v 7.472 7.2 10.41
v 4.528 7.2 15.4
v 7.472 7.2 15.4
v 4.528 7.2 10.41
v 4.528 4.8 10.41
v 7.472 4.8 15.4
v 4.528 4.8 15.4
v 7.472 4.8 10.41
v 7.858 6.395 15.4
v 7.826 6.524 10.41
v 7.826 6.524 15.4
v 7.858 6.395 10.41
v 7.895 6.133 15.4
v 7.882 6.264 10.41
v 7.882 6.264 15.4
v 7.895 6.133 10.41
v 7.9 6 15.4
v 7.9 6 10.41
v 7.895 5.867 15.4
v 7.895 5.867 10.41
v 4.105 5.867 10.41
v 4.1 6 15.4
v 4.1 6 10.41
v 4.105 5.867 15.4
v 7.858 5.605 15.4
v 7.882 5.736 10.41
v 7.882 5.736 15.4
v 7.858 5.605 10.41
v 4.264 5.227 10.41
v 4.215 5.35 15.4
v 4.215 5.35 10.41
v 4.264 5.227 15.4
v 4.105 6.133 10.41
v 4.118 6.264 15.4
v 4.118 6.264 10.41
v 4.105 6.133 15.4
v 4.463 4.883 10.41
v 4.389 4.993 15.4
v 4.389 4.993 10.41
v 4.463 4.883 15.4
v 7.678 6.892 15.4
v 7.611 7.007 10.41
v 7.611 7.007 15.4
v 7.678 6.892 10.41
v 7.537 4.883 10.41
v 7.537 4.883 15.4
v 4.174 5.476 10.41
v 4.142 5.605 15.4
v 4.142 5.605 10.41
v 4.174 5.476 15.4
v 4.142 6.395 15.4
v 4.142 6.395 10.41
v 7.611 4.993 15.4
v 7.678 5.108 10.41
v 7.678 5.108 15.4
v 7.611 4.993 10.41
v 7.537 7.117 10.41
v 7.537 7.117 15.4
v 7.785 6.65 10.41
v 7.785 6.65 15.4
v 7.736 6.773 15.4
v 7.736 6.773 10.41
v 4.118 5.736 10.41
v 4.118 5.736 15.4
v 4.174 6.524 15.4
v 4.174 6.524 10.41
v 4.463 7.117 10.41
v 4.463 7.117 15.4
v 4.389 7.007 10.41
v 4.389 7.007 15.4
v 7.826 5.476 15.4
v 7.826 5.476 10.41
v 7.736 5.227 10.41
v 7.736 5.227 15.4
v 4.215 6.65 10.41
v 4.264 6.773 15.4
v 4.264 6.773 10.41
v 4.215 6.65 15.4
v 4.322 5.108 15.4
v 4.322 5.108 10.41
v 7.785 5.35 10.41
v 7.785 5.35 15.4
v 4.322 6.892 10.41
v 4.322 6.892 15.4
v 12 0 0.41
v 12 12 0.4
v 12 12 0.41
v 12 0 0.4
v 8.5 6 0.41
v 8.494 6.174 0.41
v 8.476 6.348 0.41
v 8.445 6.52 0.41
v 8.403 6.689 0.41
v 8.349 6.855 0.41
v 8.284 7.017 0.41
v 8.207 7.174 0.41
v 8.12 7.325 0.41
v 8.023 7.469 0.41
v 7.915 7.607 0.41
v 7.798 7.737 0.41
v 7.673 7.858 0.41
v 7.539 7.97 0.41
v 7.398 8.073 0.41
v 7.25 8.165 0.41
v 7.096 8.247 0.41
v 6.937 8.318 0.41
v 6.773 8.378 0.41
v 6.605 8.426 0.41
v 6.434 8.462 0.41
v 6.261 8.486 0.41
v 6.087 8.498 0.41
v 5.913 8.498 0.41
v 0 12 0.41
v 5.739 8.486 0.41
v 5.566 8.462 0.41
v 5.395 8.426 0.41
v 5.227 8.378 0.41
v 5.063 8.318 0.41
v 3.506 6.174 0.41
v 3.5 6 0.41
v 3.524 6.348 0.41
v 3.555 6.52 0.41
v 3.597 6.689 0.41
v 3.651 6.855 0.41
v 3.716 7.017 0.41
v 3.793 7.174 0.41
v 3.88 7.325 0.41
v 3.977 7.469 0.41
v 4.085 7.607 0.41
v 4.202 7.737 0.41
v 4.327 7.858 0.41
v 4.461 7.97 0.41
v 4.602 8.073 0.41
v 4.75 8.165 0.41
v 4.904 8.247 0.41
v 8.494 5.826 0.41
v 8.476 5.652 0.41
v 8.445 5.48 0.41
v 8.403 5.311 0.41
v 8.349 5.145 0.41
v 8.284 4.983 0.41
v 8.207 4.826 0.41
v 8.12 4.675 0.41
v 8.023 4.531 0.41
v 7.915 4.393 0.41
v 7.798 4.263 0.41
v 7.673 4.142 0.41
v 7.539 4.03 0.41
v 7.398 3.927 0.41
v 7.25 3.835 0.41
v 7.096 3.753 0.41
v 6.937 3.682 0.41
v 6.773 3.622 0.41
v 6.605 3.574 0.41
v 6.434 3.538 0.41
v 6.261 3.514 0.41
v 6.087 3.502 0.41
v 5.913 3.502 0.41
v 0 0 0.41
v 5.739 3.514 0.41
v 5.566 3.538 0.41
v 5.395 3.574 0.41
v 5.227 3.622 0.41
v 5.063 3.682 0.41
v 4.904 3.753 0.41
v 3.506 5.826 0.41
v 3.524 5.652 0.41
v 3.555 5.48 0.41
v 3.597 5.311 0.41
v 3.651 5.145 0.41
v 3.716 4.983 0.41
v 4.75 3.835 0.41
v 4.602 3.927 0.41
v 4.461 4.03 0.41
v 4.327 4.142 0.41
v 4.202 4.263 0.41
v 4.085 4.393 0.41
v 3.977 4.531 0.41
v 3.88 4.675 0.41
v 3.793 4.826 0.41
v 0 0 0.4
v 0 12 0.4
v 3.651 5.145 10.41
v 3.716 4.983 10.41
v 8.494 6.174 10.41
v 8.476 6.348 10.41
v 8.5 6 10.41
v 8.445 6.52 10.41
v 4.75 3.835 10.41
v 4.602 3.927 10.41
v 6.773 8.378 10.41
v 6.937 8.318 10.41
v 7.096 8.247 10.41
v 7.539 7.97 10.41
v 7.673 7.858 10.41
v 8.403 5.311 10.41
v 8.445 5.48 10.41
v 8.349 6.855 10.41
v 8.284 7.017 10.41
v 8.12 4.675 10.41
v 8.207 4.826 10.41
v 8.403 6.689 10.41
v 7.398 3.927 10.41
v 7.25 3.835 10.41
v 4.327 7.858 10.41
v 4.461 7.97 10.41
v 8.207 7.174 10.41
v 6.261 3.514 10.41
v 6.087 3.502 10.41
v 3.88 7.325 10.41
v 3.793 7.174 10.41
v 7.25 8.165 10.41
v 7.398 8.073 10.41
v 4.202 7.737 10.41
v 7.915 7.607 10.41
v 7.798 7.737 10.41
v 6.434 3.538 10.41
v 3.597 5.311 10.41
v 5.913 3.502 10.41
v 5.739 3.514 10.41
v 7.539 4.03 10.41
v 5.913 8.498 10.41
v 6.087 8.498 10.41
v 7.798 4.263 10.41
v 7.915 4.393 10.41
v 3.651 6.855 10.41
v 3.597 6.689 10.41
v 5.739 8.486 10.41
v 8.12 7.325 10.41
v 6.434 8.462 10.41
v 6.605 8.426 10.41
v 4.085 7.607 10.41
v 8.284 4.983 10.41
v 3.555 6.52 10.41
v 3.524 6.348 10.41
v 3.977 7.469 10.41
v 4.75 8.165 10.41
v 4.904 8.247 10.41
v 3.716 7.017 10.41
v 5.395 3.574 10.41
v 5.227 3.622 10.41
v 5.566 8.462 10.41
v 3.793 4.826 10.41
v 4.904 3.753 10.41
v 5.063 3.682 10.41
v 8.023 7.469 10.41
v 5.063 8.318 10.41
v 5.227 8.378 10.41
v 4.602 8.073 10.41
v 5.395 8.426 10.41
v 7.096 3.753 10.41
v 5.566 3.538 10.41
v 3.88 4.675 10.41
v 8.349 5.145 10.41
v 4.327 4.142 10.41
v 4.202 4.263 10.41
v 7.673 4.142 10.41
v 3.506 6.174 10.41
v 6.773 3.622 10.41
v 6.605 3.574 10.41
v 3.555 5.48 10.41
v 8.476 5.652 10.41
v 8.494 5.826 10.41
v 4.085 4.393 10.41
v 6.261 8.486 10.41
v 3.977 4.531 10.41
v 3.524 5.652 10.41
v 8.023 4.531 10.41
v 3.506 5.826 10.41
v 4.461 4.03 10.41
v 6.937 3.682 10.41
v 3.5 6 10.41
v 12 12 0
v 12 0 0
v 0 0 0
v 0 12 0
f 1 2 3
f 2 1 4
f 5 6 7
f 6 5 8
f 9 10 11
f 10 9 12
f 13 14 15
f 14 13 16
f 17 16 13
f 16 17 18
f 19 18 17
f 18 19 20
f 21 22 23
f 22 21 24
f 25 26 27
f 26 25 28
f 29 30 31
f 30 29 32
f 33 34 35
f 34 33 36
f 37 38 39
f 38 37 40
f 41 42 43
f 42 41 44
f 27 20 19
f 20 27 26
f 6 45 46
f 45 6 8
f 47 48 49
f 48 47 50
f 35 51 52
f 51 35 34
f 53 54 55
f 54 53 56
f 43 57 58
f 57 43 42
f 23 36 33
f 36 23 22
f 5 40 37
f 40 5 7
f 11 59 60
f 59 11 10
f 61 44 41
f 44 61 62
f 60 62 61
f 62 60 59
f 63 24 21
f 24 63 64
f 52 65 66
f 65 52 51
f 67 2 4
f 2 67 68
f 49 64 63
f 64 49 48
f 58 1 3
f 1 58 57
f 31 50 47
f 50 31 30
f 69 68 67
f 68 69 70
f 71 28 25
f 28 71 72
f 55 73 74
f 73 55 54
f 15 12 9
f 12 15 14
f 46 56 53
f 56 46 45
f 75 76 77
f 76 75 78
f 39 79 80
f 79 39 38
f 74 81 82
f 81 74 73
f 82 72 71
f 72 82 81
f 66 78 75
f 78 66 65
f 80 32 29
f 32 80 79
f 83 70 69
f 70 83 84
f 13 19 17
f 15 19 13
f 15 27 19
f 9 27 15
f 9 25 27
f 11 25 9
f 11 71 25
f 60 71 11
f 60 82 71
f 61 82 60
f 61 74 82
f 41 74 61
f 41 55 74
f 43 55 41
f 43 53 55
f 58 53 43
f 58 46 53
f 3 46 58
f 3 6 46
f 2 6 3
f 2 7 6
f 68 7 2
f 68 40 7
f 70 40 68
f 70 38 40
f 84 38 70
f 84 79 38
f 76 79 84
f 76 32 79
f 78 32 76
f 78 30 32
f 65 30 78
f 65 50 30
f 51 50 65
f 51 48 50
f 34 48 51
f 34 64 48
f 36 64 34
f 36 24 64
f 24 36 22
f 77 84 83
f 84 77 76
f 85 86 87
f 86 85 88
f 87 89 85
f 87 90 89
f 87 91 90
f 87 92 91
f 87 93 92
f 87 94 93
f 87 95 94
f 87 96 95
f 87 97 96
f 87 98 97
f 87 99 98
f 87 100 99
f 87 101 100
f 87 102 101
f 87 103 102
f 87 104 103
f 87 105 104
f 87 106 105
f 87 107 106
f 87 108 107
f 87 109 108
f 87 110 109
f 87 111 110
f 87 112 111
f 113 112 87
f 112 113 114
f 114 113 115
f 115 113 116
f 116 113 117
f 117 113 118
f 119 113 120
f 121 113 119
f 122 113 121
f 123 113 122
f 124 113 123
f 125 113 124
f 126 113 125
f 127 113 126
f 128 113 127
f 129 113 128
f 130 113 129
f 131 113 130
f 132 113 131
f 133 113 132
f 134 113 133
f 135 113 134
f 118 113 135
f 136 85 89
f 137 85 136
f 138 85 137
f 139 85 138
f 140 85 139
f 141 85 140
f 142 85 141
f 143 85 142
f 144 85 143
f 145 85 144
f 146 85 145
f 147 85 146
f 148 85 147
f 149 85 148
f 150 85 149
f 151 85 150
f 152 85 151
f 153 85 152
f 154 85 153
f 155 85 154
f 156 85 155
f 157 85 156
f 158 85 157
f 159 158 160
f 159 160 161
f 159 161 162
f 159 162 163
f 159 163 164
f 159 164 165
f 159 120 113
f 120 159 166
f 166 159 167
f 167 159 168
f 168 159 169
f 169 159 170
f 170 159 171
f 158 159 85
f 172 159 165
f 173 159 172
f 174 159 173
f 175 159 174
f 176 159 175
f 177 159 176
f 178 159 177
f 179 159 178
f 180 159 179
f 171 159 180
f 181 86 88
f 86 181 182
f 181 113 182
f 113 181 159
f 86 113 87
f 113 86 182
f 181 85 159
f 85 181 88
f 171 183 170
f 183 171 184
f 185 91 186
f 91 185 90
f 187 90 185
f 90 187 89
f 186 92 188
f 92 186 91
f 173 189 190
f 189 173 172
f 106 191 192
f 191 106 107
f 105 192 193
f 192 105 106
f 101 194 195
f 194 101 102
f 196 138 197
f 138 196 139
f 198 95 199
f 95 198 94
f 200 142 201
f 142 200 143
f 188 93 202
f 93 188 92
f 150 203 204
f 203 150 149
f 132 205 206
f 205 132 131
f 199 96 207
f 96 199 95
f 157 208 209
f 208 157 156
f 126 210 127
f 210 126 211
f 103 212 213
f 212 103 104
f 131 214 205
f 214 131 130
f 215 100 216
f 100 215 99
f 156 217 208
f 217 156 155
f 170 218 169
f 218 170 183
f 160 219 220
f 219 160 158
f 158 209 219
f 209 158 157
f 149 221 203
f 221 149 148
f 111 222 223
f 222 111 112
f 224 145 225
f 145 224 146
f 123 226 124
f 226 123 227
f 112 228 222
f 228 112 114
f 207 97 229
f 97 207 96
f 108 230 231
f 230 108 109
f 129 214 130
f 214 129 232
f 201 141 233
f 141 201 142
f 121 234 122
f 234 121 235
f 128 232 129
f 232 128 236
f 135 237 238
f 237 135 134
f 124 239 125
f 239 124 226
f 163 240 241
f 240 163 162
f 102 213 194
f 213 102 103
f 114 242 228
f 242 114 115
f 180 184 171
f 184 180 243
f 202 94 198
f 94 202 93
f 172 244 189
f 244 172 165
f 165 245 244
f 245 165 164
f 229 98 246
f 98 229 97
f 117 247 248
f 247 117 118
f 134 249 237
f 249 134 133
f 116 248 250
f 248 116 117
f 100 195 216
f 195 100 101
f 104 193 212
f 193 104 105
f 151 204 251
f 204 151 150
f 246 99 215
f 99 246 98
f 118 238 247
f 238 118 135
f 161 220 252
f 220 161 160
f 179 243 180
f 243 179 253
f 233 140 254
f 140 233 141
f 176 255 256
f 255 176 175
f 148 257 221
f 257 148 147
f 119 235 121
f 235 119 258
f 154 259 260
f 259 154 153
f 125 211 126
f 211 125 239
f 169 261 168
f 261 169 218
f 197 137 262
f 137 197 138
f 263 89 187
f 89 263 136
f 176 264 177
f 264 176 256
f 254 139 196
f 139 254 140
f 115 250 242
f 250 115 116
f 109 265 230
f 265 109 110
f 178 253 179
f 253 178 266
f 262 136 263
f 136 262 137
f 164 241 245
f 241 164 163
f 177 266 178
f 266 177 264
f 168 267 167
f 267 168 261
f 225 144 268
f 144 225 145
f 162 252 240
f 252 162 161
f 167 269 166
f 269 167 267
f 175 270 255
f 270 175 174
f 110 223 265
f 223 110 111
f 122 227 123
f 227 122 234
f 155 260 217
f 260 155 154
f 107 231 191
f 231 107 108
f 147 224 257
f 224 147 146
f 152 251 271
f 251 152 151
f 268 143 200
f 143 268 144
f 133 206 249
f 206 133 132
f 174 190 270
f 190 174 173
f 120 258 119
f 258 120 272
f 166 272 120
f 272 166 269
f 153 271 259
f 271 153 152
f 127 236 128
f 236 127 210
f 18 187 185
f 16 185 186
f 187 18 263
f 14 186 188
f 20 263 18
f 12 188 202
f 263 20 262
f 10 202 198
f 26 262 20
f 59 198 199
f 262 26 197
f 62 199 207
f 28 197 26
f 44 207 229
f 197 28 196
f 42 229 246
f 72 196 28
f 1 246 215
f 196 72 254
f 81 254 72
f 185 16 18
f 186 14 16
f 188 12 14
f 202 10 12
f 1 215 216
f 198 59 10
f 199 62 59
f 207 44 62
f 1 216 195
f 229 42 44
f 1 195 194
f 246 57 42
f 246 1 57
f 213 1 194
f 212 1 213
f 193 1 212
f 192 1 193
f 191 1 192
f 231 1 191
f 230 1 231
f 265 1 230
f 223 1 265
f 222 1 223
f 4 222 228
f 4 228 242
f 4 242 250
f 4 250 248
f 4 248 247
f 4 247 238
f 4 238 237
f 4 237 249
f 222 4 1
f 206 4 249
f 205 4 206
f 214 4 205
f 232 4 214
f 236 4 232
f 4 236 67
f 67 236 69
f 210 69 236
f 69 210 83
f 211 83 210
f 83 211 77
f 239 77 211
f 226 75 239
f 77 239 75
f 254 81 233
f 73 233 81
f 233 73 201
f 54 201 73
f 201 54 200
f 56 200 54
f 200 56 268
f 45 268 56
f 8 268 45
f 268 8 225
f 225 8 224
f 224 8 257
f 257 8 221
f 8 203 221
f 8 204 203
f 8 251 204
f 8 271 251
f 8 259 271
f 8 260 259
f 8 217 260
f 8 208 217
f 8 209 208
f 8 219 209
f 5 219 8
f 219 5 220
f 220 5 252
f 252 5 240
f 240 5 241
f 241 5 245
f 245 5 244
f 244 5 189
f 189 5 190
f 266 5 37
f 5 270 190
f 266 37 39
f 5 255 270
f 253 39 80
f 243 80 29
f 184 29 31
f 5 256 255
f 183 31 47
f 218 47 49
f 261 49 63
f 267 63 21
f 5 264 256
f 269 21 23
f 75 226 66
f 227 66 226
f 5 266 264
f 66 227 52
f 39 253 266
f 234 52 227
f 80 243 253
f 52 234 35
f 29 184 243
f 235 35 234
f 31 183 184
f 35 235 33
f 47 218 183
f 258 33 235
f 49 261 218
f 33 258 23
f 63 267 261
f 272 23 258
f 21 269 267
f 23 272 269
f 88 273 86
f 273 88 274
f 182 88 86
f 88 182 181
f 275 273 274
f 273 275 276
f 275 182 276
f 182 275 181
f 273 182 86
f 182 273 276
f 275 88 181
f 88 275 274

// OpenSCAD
// file: ../../Base/PlacementOptions.scad
// Fischertechnik Box Foundation
// Placement Options

// Alignment
NoAlign = 0;
AlignLeft = 1;
AlignBottom = 2;
AlignCenter = 3;
AlignRight = 4;
AlignTop = 5;

// Element rotation degree steps
rotations = [0, -90, -180, -270];

// Rotation
NoRotation = 0;
Rotate0 = 0;
Rotate90 = 1;
Rotate180 = 2;
Rotate270 = 3;

// Docking (seen from above)
NoDock = -1;
DockLeft = 0;
DockTop = 1;
DockRight = 2;
DockCorner = 2;
DockBottom = 3;

// Web corners
LowerLeft = 0;
UpperLeft = 1;
UpperRight = 2;
LowerRight = 3;

// Web position relative to corner
LeftOfCorner = 0;
RightOfCorner = 1;

// Rails direction
Horizontal = true;
Vertical = false;
// file: ../../Base/Boxes.scad
// Fischertechnik Box Foundation
// Pre-designed Boxes

use <Constants.scad>

include <PlacementOptions.scad>

box190Width = 190;
box190Depth = 130;
box130Width = 130;
box130Depth = 95;

// Values are from an original ec3 box
topBottomDifference = 1.5;
outerHeight = 40;
baseThickness = 1.8;
innerHeight = outerHeight - baseThickness;
stackExcess = 5.7;
radius = 3.5;
wallThickness = 1.5;
tolerance = 0.2;

boxWallThickness = wallThickness;
boxBaseThickness = baseThickness;
boxWebWidth = 3.0;

// getBoxWallThickness()
// Gets the wall thickness of a Fischertechnik Box
function getBoxWallThickness() = boxWallThickness;

// getBoxUsageHeight(height = 38.2)
// Gets the usable height of a Fischertechnik box
// height = Outer height of the box from the bottom to the upper edge.
function getBoxUsageHeight(height = outerHeight) = height - baseThickness - stackExcess;

// getBoxInnerHeight()
// Gets the inner height of a Fischertechnik box, including the stack excess
function getBoxInnerHeight() = innerHeight;

// getBoxBaseThickness()
// Gets the thickness of the Fischertechnik box base.
function getBoxBaseThickness() = boxBaseThickness;

// getBoxWebWidth()
// Gets the width of a box web
function getBoxWebWidth() = boxWebWidth;

// getBox190Space()
// Gets the usable inner space of a Box 190 as an x/y-list
function getBox190Space() = [
    box190Width - 2*getBoxWallThickness() - topBottomDifference, 
    box190Depth - 2*getBoxWallThickness() - topBottomDifference ];

// RoundedCornerPlate(width, depth, height, radius)
// Creates a body plate with rounded corners for a box. Used
// also to create the complete box with the hull module.
// width = Width of the plate
// depth = depth of the plate 
// height = thickness of the plate
// radius = radius of the rounded corner
module RoundedCornerPlate(width, depth, height, radius) {
    translate([radius, radius])
    hull() {
        w = width-2*radius;
        d = depth-2*radius;
        cube([w, d, height]);
        cylinder(height, r=radius, $fn=getFragments());
        translate([w, 0])
            cylinder(height, r=radius, $fn=getFragments());
        translate([w, d])
            cylinder(height, r=radius, $fn=getFragments());
        translate([0, d])
            cylinder(height, r=radius, $fn=getFragments());
    }
}

// BoxBase(width, depth)
// Creates an empty stackable Fischertechnik compatible box
// width = Outer width of the box (190, 130, ...)
// depth = Outer depth of the box (130, 95, ...)

module BoxBase(width, depth, height=outerHeight) {    
    thinPlate = 0.01;

    innerHeight = height - baseThickness;    
    
    module Body(tolerance=tolerance) {
        hull() {
            // Bottom with tolerance to fit into the original boxes when stacked
            translate([-wallThickness+tolerance, -wallThickness+tolerance, -baseThickness])
                RoundedCornerPlate(width-topBottomDifference-2*tolerance, depth-topBottomDifference-2*tolerance, thinPlate, radius);
            
            // Top
            translate([-wallThickness-topBottomDifference/2, -wallThickness-topBottomDifference/2, innerHeight-thinPlate])
                RoundedCornerPlate(width, depth, thinPlate, radius);
         }
    }

    module Cutoff() {
        hull() {
            coWidth = width - 2*wallThickness;
            coDepth = depth - 2*wallThickness;
            
            // Bottom
            RoundedCornerPlate(coWidth-topBottomDifference, coDepth-topBottomDifference, thinPlate, radius);

            // Top
            translate([-topBottomDifference/2, -topBottomDifference/2, innerHeight+thinPlate]) 
                RoundedCornerPlate(coWidth, coDepth, thinPlate, radius);
        }
    }
    
    difference() {        
        Body();
        Cutoff();
        stackOffset = innerHeight - stackExcess;
        translate([0, 0, stackOffset + baseThickness])
            Body(tolerance=0);
    }
}

// Creates the Fischertechnik empty box 130x190 mm and places it at position 0,0
// 190x130 are the outer sizes, the inner space is slightly smaller. Use getBox190Space() to get the inner sizes.
// The box is positioned that the usable inner space is at the 0,0,0 position.

module Box190() {
    BoxBase(box190Width, box190Depth);
}

// Gets the usable inner space of a Box 130 as an x/y-list
function getBox130Space() = [
    box130Width - 2*getBoxWallThickness() - topBottomDifference, 
    box130Depth - 2*getBoxWallThickness() - topBottomDifference ];

// Creates the Fischertechnik empty box 95x130 mm and places it at position 0,0
// 190x130 are the outer sizes, the inner space is slightly smaller. Use getBox190Space() to get the inner sizes.
// The box is positioned that the usable inner space is at the 0,0,0 position.

module Box130() {
    BoxBase(box130Width, box130Depth);
}

// Creates a web at the specified box walls
// corner 0 = LowerLeft, 1 = UpperLeft, 2 = UpperRight, 3 = LowerRight
// side 0 = LeftOfCorner, 1 = RightOfCorner
// distance = Distance in mm from the corner
// boxSpace = inner width and depth of the box (default: Box 190)
// webWidth = length of the web (default is 3 mms)
// webThickness = thickness of the web (default is 1 mm)
// height = Height of the web (standard is getBoxUsageHeight())
// sink = How much of the web is sunk into the wall

module BoxWeb(
    corner, 
    side, 
    distance, 
    boxSpace=getBox190Space(), 
    webWidth=getBoxWebWidth(), 
    webThickness=1.0, 
    height=getBoxUsageHeight(),
    sink = getBoxWallThickness()/2) {
    width = (corner % 2 == 0) ? 
            (side == LeftOfCorner ? webWidth : webThickness) :
            (side == LeftOfCorner ? webThickness : webWidth);

    depth = (corner % 2 == 0) ? 
            (side == RightOfCorner ? webWidth : webThickness) :
            (side == RightOfCorner ? webThickness : webWidth);
    
    xDiff = corner == LowerLeft ? 
                (side == LeftOfCorner ? -sink : distance) :
            (corner == UpperLeft ?                
                (side == LeftOfCorner ? distance : -sink) :
            (corner == UpperRight ?
                (side == LeftOfCorner ? boxSpace.x-webWidth+sink : boxSpace.x-distance-webThickness) :
                (side == LeftOfCorner ? boxSpace.x-distance-webThickness: boxSpace.x-webWidth+sink)));

    yDiff = corner == LowerLeft ? 
                (side == RightOfCorner ? -sink : distance) :
            (corner == UpperLeft ?
                (side == RightOfCorner ? boxSpace.y-distance-webThickness : boxSpace.y-webWidth+sink) :
            (corner == UpperRight ?
                (side == RightOfCorner ? boxSpace.y-webWidth+sink : boxSpace.y-distance-webThickness) :
                (side == RightOfCorner ? distance : -sink)));
    
    translate([xDiff, yDiff, -getExcess()])
        cube([width, depth, height + 2*getExcess()]);
}
// file: ../../Base/Rotation.scad
// Fischertechnik Box Foundation
// Geometry Helpers Rotation

include <PlacementOptions.scad>

// getRotatedSpace(space, rotation=NoRotation)
// Rotates the space dependent on the specified rotation

function getRotatedSpace(space, rotation=NoRotation) = [
    (rotation == Rotate90 || rotation == Rotate270) ? space.y : space.x,
    (rotation == Rotate90 || rotation == Rotate270) ? space.x : space.y
];

// Rotates the given space around the fixed left lower corner
// space = the space the children needs as width/depth list [width,depth]
// rotation = 0 Rotate0 degrees, 1 Rotate90 degrees, 2 Rotate180 degrees, 3 Rotate270 degrees (equivalent to -90)

module RotateFix(space, rotation=NoRotation) {
    dy = (rotation == Rotate0 || rotation == Rotate270) ? 0 :
        (rotation == Rotate90) ? space.x :
        space.y;
    dx = (rotation < Rotate180) ? 0 :
        (rotation == Rotate180) ? space.x :
        space.y;
    
    translate([dx, dy, 0])
        rotate([0, 0, rotations[rotation]])
            children();
}
// file: ../../Base/Alignment.scad
// Fischertechnik Box Foundation
// Geometry Helpers Alignment

include <PlacementOptions.scad>

// getAlignedX(elementWidth, spaceWidth, align=AlignRight, offset=0)
// Gets the aligned X offset of an element with the given
// width in the given space.
// elementWidth = The width of the element to positon
// spaceWidth = The space where the element should be aligned
// align = 0 AlignLeft, 1 AlignCenter, 2 AlignRight
// offset = an optional offset from the aligned position. When
// aligned left or centered, then positive values are in X direction.
// When aligned right then positive values are in negative X direction.

function getAlignedX(elementWidth, spaceWidth, align=AlignRight, offset=0) =
    (align == AlignLeft) ?
        offset :
        ((align == AlignCenter) ?
        (spaceWidth - elementWidth)/2 + offset :
        spaceWidth - offset - elementWidth);

// getAlignedY(elementDepth, spaceDepth, align=AlignTop, offset=0)
// Gets the aligned Y offset of an element with the given
// depth in the given space.
// elementDepth = The depth of the element to positon
// spaceDepth = The space where the element should be aligned
// align = 0 AlignBottom, 1 AlignCenter, 2 AlignTop
// offset = an optional offset from the aligned position. When
// aligned bottom or centered, then positive values are in Y direction.
// When aligned top then positive values are in negative Y direction.

function getAlignedY(elementDepth, spaceDepth, align=AlignTop, offset=0) =
    (align == AlignBottom) ?
        offset :
        ((align == AlignCenter) ?
        (spaceDepth - elementDepth)/2 + offset :
        spaceDepth - offset - elementDepth);
// file: ../../Base/Placement.scad
// Fischertechnik Box Foundation
// Geometry Helpers Placement

use <Constants.scad>
use <Alignment.scad>
use <Rotation.scad>
use <Boxes.scad>

include <PlacementOptions.scad>

// Place(x=0, y=0, elementSpace=[0,0], alignX=AlignLeft, alignY=AlignBottom, rotation=Rotate0, boxSpace=getBox190Space())
// Places the child at the specified position
// y = Y-Position. This is a relative position when an X aligment is specified.
// x = X-Position. This is a relative position when an Y aligment is specified.
// elementSpace = space of the element to be placed [x,y]
// alignX = -1=NoAlign, 0 AlignLeft, 1 AlignCenter, 3 AlignRight (elementSpace and boxSpace required!)
// alignY = -1=NoAlign, 2 AlignBottom, 1 AlignCenter, 4 AlignTop (elementSpace and boxSpace required!)
// rotation = 0 Rotate0 0 degrees, 1 Rotate90 90 degrees, 
// 2 Rotate180 180 degrees, 3 Rotate270 270 degrees (equivalent to -90)
// boxSpace = Inner space of the box where the placement occurs [x,y] - default is Box 190x130 inner space

module Place(x=0, y=0, elementSpace=[0,0], 
  alignX=AlignLeft, alignY=AlignBottom, 
  rotation=NoRotation, boxSpace=getBox190Space()) {

    module Position(x, y, space, rotation=Rotate0) {
        translate([x, y, 0])
            RotateFix(space, rotation)
                children();
    }

    space = getRotatedSpace(elementSpace, rotation);
    alignedX = getAlignedX(space.x, boxSpace.x, alignX, x);
    alignedY = getAlignedY(space.y, boxSpace.y, alignY, y);
    Position(alignedX, alignedY, elementSpace, rotation)
        children();
}

// Center(space=getBox130Space(), elementSpace=[0,0])
// space = Space where the children is centered. For cylinder use centered=true and no elementSpace.
// elementSpace = space of the element to be centered [x,y]

module Center(space=getBox190Space(), elementSpace=[0,0]) {
    Place(elementSpace=elementSpace, boxSpace=space, alignX=AlignCenter, alignY=AlignCenter)
        children();
}

// CenterHorizontal(width=0, y=0, offset=0, space=getBox130Space())
// width = Width of the element to be placed.
// y = Y position of the element
// offset = Offset from the center position (negative will be left of the center)
// space = Space where the element is placed

module CenterHorizontal(width=0, y=0, offset=0, space=getBox190Space()) {
    Place(x=offset, y=y, elementSpace=[width, 0], boxSpace=space, alignX=AlignCenter)
        children(0);
}

// CenterVertical(depth=0, x=0, offset=0, space=getBox130Space())
// depth = Depth of the element to be placed.
// x = X position of the element
// offset = Offset from the center position (negative will be down of the center)
// space = Space where the element is placed

module CenterVertical(depth=0, x=0, offset=0, space=getBox190Space()) {
    Place(x=x, y=offset, elementSpace=[0, depth], boxSpace=space, alignY=AlignCenter)
        children(0);
}

// getIsVertical(align)
// True if the specified alignment needs a vertical orientation for a divider (AlignRight, AlignLeft)

function getIsVertical(align) = (align == AlignRight || align == AlignLeft);

// getIsHorizontal(align)
// True if the specified alignment needs a horizontal orientation for a divider (AlignTop, AlignBottom)

function getIsHorizontal(align) = (align == AlignTop || align == AlignBottom);
// file: ../../Elements/AxisClip10.scad
// Fischertechnik Box Library
// Axis for clip 10
// 31023

use <../ModelBase/Simple.scad>
use <../Base/Constants.scad>

/* [Element Parameters] */
height = 23;
clipHeight = 10;

/* [Hidden] */
width = 12;
depth = 12;
upperDiameter = 3.6;

// getAxisClip10Space()
// Gets the space of a n axis for a clip 10 with spring ring (mot2)

function getAxisClip10Space() = [width, depth, height];

// AxisClip10(height, clipHeight)
// Axis for clip 10 with spring ring (mot2)
// height = Height of the complete axis (standard is 23, in mot3 its only 12)
// clipHeight = Height of the part for the clip (standard is 10, in mot3 its only 7)

module AxisClip10(height=height, clipHeight=clipHeight) {
    LeveledAxisWithSpace(height, height-clipHeight, getAxisClip10Space(), diameter=upperDiameter);
}

// Test
color("lightgray")
AxisClip10(height, clipHeight);
// file: ../../Base/Constants.scad
// Fischertechnik Box Foundation
// Constants

// Constant values necessary for multiple elements

// Base constants
dividerThickness = 1.2;
excess = 0.01;
fragments = 90;
tolerance = 0.8;

// Gets the thickness of a divider 
function getDividerThickness() = dividerThickness;

// Gets the excess that is used to merge walls into each other
function getExcess() = excess;

// Gets amount of fragments of a cylinder
function getFragments() = fragments;

// Gets the inner tolerance of a frame to each side
function getTolerance() = tolerance;


// Fischertechnik specific constants
axisDiameter = 4;
axisBottomDiameter = axisDiameter + 1;
axisTolerance = 0.2;
axisLockingLength = 8;

// Gets axis diameter of Fischertechnik axis
function getAxisDiameter() = axisDiameter;

// Gets axis diameter tolerance (subtracted for element axis)
function getAxisTolerance() = axisTolerance;

// Gets the axis diameter for standing axis
function getStandAxisDiameter() = getAxisDiameter() - getAxisTolerance();

// Gets axis bottom diameter for thicker part at the bottom
function getAxisBottomDiameter() = axisBottomDiameter;

// Gets the lengthh of the locking part of a locking axis
function getAxisLockingLength() = axisLockingLength;

// Studs

studHeight = 2.5;
studTolerance = 0.2;

// gets the height of a connecting stud
function getStudHeight() = studHeight;

// gets the connecting stud height tolerance
function getStudTolerance() = studTolerance;

// Dockable Frame with Edge

standardEdgeDistance = 2.5;
standardWebDistance = 11.5;
standardCornerLength = 15;

// gets the standard distance to the wall of the box for dockable frames with webs
function getStandardEdgeDistance() = standardEdgeDistance;

// gets the standard distance of each web to the corner of the dockable frame
function getStandardWebDistance() = standardWebDistance;

// gets the standard length of the corner walls of a dockable frame
function getStandardCornerLength() = standardCornerLength;

// Tubes

tubeWallFactor = 0.8;

// gets the wall thickness of a tube.
function getTubeWallThickness() = tubeWallFactor * getDividerThickness();

// Small Parts and Divider Frame

smallPartsFrameHeight = 20;

// gets the frame height for docked small parts boxes.
function getSmallPartsFrameHeight() = smallPartsFrameHeight;

// Hubs

hubRingDiameter = 19.5;
hubRingLevelDiameter = 21;

// gets the diameter of a tube matching the inner ring of a wheel
function getHubRingDiameter() = hubRingDiameter;

// gets the diameter of a hub tube with a thicker diameter
function getHubRingLevelDiameter() = hubRingLevelDiameter;

// Struts

strutAddLength = 9.0;
strutDepth = 8.0;

// gets the full length of a strut
function getFullStrutLength(length) = length + strutAddLength;

// gets the radius of the end of a strut
function getStrutEndRadius() = strutAddLength / 2;

// gets the the depth of a strut
function getStrutDepth() = strutDepth;
// file: ../../Elements/AxisLockingPulley12.scad
// Fischertechnik Box Library
// Axis for Locking Pulley 12
// 136775

use <../Base/Constants.scad>
use <../Base/Placement.scad>
use <../ModelBase/Simple.scad>

/* [Hidden] */
width = 12;
depth = 12;

// getAxisLockingPulley12Space()
// Gets the space the locking pulley needs

function getAxisLockingPulley12Space() = [width, depth];

// AxisLockingPulley12()
// Standing locking axis for locking pulley.

module AxisLockingPulley12() {
    space = [width, depth];
    height = 10;
    Space(space);
    translate([width/2, depth/2])
    cylinder(d=getAxisBottomDiameter(), h=height, $fn=getFragments());
    translate([0, 0, height-getExcess()])
        Center(space)
            LockingAxis(5);
}

// Tests
color("lightgray")
AxisLockingPulley12();
// file: ../TestPrint.scad
// 3D Print Test Base

use <../Base/Constants.scad>

use <../Elements/AxisClip10.scad>

module TestPrint(elementSpace) {
    cube([elementSpace.x, elementSpace.y, 0.4]);
    translate([0,0,0.4+getExcess()]) {
        children();
    }
}

TestPrint(getAxisClip10Space())
    AxisClip10();
// main file
// 3D Print Test
// AxisLockingPulley12

use <../TestPrint.scad>
use <../../Elements/AxisLockingPulley12.scad>

TestPrint(getAxisLockingPulley12Space())
    AxisLockingPulley12();
